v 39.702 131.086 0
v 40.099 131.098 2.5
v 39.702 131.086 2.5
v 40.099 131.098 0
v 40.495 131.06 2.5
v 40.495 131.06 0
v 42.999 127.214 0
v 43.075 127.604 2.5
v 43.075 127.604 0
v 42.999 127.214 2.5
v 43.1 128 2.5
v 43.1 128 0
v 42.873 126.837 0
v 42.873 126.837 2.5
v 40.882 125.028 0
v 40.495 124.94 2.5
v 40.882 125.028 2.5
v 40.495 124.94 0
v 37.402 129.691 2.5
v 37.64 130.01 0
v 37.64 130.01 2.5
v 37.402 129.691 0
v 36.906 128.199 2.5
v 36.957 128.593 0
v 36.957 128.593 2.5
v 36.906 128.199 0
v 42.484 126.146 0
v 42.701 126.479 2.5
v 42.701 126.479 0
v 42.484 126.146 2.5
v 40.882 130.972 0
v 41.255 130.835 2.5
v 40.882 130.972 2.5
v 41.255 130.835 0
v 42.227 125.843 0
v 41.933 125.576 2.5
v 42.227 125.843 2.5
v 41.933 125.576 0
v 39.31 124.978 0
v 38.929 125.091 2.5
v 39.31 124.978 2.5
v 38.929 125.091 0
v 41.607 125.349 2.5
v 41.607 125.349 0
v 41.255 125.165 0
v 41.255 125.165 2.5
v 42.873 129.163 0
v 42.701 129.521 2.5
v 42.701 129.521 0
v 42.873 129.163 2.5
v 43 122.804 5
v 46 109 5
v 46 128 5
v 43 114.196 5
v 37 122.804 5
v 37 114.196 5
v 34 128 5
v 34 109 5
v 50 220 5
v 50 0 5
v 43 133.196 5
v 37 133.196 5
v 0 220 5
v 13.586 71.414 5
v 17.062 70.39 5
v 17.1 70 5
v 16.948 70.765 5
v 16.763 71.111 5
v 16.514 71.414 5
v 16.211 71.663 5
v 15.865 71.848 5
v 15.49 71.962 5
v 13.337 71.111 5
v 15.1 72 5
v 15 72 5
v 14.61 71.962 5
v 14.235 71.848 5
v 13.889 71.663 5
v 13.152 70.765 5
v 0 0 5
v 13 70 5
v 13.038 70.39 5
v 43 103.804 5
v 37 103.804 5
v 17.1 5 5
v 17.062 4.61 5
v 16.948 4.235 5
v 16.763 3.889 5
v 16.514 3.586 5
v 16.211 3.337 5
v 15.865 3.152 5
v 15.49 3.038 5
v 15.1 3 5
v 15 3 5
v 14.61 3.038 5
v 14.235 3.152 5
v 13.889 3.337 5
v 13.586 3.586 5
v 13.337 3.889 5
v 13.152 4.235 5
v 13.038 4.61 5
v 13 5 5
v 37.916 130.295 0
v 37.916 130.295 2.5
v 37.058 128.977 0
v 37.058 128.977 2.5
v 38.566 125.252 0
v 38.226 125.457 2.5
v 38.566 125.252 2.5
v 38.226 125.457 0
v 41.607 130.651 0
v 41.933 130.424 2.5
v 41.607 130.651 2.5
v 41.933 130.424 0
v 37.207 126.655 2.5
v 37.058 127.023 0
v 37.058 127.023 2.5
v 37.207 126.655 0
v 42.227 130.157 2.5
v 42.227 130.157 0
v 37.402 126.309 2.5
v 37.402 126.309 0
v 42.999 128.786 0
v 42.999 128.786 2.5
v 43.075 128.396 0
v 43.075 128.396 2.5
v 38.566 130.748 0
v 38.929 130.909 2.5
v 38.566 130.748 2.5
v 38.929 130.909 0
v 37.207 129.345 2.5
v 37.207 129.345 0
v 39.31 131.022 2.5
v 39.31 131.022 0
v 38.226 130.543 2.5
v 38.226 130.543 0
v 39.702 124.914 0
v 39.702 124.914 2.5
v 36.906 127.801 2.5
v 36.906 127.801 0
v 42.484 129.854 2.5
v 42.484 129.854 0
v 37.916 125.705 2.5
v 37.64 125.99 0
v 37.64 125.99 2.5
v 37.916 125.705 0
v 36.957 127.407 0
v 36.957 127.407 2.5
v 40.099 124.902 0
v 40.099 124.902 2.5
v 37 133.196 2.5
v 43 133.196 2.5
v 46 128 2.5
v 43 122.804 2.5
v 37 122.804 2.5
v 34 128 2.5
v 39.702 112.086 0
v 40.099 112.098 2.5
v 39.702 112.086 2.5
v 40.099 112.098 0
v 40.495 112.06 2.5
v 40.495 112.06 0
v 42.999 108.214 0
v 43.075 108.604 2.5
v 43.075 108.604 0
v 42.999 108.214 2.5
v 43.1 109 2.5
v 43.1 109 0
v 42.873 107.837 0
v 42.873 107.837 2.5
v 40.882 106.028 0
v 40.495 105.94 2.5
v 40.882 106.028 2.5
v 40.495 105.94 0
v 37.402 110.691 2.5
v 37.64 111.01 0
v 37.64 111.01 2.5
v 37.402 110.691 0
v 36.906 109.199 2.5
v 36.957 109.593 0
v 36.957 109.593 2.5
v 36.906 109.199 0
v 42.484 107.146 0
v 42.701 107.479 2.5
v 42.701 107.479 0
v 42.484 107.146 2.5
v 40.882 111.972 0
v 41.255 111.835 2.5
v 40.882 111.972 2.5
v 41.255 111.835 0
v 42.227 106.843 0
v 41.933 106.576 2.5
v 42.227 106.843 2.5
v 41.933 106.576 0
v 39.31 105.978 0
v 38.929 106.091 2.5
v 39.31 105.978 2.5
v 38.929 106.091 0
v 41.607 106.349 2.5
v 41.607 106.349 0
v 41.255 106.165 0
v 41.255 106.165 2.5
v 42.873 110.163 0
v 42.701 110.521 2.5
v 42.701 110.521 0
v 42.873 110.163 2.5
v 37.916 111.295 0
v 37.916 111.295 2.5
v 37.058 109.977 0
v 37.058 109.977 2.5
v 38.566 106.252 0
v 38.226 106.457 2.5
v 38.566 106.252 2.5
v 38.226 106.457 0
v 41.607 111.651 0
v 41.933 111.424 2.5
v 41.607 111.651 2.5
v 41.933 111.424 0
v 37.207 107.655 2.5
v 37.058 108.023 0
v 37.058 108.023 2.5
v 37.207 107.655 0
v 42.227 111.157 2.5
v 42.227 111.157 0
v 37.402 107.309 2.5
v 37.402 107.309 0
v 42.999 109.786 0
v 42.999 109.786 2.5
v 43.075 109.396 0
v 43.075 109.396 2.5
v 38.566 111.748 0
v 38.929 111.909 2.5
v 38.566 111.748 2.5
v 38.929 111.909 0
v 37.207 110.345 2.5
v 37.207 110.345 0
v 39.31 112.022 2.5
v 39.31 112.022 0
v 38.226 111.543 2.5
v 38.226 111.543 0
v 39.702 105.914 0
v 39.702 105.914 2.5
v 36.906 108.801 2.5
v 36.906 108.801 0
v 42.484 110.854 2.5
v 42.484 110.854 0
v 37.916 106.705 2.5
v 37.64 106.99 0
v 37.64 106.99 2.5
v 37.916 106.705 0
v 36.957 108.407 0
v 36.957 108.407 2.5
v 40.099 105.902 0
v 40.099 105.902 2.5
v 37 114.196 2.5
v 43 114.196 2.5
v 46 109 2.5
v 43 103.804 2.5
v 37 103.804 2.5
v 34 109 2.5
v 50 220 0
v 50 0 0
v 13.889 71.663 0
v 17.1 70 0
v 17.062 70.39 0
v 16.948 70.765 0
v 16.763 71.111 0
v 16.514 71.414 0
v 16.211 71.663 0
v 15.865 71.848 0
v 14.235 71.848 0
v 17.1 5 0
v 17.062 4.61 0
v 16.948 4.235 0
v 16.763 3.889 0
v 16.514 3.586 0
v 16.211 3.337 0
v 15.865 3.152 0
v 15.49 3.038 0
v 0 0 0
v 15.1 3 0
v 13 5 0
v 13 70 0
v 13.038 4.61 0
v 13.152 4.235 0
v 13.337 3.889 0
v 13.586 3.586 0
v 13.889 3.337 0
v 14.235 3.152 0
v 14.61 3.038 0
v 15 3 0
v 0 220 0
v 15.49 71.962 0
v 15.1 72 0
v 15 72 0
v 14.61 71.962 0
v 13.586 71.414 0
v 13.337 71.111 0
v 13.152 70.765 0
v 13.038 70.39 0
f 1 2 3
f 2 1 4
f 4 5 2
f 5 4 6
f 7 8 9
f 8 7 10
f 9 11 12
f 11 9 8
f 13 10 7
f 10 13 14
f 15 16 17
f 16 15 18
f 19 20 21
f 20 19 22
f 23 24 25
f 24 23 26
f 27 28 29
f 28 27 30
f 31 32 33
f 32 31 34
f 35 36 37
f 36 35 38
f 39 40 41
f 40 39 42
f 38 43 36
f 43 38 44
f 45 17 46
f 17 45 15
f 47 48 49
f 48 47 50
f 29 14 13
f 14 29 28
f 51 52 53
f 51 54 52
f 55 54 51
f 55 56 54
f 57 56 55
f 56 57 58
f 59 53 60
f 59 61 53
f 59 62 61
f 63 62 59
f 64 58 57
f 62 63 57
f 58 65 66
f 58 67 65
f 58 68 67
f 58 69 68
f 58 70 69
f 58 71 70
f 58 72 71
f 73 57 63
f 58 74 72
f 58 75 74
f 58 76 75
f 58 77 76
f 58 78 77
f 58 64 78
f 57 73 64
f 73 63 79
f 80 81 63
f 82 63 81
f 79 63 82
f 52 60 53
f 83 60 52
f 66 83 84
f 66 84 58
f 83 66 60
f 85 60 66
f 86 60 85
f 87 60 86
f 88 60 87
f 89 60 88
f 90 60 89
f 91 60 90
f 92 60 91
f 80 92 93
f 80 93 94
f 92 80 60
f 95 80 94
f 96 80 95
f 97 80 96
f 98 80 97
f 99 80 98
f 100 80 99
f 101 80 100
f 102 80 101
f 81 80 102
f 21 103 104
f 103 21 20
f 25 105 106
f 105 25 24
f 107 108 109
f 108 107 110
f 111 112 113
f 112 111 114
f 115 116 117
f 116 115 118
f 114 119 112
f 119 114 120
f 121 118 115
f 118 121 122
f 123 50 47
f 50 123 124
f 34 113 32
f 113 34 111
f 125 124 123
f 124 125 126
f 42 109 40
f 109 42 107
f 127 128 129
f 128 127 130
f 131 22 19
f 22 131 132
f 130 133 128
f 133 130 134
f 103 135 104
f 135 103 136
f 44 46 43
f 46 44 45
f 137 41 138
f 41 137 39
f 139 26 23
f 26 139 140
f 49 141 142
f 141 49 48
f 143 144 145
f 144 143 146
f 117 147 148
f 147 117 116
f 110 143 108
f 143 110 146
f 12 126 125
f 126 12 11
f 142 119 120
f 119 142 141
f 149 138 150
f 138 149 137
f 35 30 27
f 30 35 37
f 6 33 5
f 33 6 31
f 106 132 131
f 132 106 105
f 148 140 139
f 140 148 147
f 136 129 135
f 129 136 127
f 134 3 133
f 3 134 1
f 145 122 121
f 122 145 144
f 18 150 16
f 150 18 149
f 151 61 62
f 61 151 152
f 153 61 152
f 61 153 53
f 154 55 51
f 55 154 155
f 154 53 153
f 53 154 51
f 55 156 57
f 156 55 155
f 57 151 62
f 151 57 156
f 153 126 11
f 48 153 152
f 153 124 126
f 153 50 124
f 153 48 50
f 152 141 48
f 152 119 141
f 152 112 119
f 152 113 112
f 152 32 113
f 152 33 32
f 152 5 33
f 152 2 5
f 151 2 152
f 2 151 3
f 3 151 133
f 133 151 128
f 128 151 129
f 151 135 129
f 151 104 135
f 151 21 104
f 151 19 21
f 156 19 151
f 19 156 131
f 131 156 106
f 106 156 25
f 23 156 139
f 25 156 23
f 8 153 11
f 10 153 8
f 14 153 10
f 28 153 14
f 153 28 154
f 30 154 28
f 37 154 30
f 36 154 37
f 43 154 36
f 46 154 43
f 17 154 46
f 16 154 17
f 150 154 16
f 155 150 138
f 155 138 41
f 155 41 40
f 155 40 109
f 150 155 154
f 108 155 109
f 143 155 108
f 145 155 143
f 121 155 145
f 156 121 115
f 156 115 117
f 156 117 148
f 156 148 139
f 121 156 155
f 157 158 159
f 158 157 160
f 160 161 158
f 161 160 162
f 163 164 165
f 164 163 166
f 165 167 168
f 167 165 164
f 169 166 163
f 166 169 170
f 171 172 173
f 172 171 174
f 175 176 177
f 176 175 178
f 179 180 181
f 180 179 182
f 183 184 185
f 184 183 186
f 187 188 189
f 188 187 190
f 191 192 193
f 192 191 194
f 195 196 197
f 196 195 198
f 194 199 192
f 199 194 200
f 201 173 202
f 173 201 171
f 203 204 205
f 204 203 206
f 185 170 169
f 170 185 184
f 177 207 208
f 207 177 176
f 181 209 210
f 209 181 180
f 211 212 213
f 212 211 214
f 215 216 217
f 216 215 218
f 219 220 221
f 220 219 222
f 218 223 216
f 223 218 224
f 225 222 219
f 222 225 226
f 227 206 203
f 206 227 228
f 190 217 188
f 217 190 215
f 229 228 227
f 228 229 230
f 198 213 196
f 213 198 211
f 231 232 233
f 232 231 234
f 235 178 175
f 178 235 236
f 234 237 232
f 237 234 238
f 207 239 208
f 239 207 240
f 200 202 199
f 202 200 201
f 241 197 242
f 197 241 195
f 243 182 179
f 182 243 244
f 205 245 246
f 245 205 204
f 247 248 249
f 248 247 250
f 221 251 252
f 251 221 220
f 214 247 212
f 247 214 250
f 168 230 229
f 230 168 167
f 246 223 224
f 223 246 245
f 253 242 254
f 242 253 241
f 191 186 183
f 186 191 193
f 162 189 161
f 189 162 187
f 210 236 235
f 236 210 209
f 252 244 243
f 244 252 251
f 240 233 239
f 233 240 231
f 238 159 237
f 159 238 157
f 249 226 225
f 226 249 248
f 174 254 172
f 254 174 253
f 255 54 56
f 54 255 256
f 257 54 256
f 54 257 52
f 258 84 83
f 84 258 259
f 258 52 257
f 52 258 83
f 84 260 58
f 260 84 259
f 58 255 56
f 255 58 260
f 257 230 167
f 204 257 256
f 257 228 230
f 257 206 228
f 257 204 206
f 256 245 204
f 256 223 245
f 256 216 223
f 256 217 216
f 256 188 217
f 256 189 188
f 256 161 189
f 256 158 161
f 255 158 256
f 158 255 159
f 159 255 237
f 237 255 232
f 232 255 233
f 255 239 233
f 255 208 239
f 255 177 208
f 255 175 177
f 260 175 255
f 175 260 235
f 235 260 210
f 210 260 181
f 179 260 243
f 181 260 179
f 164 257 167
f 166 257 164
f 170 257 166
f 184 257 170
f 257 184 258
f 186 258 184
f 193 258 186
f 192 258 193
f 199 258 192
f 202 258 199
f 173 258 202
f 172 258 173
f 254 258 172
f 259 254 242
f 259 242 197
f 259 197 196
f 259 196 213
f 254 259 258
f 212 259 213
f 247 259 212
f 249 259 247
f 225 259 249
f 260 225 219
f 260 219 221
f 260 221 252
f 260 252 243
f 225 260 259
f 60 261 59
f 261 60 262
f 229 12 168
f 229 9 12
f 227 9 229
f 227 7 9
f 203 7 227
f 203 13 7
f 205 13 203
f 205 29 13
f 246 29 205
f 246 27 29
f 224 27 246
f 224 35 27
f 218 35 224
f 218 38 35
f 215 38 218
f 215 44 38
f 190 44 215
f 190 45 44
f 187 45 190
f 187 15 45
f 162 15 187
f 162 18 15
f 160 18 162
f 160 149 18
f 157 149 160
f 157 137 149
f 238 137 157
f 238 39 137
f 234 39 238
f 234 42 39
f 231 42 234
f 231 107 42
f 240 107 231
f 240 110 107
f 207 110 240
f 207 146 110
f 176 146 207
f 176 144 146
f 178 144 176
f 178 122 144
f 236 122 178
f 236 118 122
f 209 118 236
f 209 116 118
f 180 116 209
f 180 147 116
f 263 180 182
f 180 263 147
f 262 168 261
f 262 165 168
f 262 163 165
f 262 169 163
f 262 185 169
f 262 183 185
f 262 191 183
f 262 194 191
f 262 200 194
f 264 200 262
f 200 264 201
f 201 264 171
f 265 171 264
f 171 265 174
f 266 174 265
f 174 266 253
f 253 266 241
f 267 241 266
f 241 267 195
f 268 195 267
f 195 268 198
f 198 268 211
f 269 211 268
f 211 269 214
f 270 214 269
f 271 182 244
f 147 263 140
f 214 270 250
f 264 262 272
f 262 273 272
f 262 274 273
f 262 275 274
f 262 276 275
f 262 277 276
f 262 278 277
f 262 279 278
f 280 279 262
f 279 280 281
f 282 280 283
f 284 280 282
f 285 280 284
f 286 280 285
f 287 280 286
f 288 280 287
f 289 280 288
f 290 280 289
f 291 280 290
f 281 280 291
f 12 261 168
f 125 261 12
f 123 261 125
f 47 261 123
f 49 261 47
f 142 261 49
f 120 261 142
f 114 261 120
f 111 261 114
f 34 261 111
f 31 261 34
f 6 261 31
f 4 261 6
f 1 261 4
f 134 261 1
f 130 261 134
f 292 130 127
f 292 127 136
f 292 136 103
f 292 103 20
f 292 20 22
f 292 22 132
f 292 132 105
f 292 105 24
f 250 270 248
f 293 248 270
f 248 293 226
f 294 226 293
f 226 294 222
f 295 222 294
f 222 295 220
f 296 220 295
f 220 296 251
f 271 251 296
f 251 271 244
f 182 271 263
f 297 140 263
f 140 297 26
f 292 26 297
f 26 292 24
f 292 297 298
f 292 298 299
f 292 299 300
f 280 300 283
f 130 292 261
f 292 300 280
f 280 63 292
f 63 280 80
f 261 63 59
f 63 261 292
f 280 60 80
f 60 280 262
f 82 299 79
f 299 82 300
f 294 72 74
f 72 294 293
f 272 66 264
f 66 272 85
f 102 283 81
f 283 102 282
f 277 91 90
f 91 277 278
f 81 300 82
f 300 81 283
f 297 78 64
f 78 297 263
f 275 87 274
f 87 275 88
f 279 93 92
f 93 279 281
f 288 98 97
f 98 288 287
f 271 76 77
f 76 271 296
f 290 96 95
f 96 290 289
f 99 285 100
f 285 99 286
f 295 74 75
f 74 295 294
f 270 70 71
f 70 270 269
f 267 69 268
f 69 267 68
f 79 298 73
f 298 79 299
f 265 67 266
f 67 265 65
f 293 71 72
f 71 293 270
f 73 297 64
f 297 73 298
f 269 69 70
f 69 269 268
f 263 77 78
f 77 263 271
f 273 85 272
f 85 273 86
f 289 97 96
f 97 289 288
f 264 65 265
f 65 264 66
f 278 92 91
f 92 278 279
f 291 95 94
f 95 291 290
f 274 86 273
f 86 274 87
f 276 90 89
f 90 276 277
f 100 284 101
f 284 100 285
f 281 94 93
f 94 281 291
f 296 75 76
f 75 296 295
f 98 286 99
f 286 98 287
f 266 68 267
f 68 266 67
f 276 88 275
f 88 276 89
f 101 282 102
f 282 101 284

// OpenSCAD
$fa = 1;
$fs = 0.4;

holder=0;
short_bar=0;
extended_bar=1;

nema14_width=35;
nema14_depth=30;
bar_height=5;
bar_length=140;
bar_width=50;
bar_slot_length=nema14_width+30;
bar_extension=80;
screw_size=4;
m3_hole = 3.2;
sled_width=nema14_width+10;

module short_bar() {
  difference() {
    cube([bar_width,bar_length,bar_height]);
    // slot
    translate([nema14_depth/2,5,0]) {
      minkowski() {
        cube([0.1,bar_slot_length,bar_height]);
        cylinder(r=2,h=5);
      }
    }
    // screw holes
    translate([bar_width-10,bar_length-12,bar_height])
      rotate([180,0,0])
        M6_bolt();

    translate([bar_width-10,bar_length-31,bar_height])
      rotate([180,0,0])
        M6_bolt();
  }
}

module extended_bar() {
  extended_bar_length = bar_length + bar_extension;
  difference() {
    cube([bar_width,extended_bar_length,bar_height]);
    // slot
    translate([nema14_depth/2,5,0]) {
      minkowski() {
        cube([0.1,bar_slot_length,bar_height]);
        cylinder(r=2,h=5);
      }
    }
    // screw holes
    translate([bar_width-10,extended_bar_length-92,bar_height])
      rotate([180,0,0])
        M6_bolt();

    translate([bar_width-10,extended_bar_length-111,bar_height])
      rotate([180,0,0])
        M6_bolt();
  }
}

module M4_bolt() {
  cylinder(r=2.1,h=25);
  cylinder(r=4.2,h=2.5,$fn=6);
}

module M6_bolt() {
  cylinder(r=3.1,h=25);
  cylinder(r=6,h=2.5,$fn=6);
}

module triangle_support(){
  difference(){
      cube([20,20,2]);
      rotate([0,0,45]) cube([50,50,50]);
  }
}

module nema14_face() {
  difference() {
    cube([4,40,50]);
    // 26 apart
    translate([0,7,4])
      minkowski() {
        cube([4,1,40]);
        rotate([0,90,0])
          cylinder(r=1,h=4);
      }

    translate([0,33,4])
      minkowski() {
        cube([4,1,40]);
        rotate([0,90,0])
          cylinder(r=1,h=4);
      }

    translate([0,18,5])
      minkowski() {
        cube([4,4,40]);
        rotate([0,90,0])
          cylinder(r=2,h=4);
      }
  }
}

module tab() {
  difference() {
    cylinder(r=10, h=4);
    translate([0,-4,5])
      rotate([180,0,0])
        M4_bolt();
  }
}

module nema14_holder() {
  cube([30,40,4]);
  translate([15,0,0])
    tab();
  translate([15,40,0])
    rotate([0,0,180])
      tab();

  translate([0,0,3])
    nema14_face();

  // supports
  translate([nema14_depth-6,0,4])
    rotate([90,0,180])
      triangle_support();
  translate([nema14_depth-6,38,4])
    rotate([90,0,180])
      triangle_support();
}


if ( holder == 1 ) {
  rotate([0,0,180])
    translate([-30,-30,20])
      nema14_holder();
}

if ( short_bar == 1 ) {
  short_bar();
}

if ( extended_bar == 1 ) {
  extended_bar();
}
